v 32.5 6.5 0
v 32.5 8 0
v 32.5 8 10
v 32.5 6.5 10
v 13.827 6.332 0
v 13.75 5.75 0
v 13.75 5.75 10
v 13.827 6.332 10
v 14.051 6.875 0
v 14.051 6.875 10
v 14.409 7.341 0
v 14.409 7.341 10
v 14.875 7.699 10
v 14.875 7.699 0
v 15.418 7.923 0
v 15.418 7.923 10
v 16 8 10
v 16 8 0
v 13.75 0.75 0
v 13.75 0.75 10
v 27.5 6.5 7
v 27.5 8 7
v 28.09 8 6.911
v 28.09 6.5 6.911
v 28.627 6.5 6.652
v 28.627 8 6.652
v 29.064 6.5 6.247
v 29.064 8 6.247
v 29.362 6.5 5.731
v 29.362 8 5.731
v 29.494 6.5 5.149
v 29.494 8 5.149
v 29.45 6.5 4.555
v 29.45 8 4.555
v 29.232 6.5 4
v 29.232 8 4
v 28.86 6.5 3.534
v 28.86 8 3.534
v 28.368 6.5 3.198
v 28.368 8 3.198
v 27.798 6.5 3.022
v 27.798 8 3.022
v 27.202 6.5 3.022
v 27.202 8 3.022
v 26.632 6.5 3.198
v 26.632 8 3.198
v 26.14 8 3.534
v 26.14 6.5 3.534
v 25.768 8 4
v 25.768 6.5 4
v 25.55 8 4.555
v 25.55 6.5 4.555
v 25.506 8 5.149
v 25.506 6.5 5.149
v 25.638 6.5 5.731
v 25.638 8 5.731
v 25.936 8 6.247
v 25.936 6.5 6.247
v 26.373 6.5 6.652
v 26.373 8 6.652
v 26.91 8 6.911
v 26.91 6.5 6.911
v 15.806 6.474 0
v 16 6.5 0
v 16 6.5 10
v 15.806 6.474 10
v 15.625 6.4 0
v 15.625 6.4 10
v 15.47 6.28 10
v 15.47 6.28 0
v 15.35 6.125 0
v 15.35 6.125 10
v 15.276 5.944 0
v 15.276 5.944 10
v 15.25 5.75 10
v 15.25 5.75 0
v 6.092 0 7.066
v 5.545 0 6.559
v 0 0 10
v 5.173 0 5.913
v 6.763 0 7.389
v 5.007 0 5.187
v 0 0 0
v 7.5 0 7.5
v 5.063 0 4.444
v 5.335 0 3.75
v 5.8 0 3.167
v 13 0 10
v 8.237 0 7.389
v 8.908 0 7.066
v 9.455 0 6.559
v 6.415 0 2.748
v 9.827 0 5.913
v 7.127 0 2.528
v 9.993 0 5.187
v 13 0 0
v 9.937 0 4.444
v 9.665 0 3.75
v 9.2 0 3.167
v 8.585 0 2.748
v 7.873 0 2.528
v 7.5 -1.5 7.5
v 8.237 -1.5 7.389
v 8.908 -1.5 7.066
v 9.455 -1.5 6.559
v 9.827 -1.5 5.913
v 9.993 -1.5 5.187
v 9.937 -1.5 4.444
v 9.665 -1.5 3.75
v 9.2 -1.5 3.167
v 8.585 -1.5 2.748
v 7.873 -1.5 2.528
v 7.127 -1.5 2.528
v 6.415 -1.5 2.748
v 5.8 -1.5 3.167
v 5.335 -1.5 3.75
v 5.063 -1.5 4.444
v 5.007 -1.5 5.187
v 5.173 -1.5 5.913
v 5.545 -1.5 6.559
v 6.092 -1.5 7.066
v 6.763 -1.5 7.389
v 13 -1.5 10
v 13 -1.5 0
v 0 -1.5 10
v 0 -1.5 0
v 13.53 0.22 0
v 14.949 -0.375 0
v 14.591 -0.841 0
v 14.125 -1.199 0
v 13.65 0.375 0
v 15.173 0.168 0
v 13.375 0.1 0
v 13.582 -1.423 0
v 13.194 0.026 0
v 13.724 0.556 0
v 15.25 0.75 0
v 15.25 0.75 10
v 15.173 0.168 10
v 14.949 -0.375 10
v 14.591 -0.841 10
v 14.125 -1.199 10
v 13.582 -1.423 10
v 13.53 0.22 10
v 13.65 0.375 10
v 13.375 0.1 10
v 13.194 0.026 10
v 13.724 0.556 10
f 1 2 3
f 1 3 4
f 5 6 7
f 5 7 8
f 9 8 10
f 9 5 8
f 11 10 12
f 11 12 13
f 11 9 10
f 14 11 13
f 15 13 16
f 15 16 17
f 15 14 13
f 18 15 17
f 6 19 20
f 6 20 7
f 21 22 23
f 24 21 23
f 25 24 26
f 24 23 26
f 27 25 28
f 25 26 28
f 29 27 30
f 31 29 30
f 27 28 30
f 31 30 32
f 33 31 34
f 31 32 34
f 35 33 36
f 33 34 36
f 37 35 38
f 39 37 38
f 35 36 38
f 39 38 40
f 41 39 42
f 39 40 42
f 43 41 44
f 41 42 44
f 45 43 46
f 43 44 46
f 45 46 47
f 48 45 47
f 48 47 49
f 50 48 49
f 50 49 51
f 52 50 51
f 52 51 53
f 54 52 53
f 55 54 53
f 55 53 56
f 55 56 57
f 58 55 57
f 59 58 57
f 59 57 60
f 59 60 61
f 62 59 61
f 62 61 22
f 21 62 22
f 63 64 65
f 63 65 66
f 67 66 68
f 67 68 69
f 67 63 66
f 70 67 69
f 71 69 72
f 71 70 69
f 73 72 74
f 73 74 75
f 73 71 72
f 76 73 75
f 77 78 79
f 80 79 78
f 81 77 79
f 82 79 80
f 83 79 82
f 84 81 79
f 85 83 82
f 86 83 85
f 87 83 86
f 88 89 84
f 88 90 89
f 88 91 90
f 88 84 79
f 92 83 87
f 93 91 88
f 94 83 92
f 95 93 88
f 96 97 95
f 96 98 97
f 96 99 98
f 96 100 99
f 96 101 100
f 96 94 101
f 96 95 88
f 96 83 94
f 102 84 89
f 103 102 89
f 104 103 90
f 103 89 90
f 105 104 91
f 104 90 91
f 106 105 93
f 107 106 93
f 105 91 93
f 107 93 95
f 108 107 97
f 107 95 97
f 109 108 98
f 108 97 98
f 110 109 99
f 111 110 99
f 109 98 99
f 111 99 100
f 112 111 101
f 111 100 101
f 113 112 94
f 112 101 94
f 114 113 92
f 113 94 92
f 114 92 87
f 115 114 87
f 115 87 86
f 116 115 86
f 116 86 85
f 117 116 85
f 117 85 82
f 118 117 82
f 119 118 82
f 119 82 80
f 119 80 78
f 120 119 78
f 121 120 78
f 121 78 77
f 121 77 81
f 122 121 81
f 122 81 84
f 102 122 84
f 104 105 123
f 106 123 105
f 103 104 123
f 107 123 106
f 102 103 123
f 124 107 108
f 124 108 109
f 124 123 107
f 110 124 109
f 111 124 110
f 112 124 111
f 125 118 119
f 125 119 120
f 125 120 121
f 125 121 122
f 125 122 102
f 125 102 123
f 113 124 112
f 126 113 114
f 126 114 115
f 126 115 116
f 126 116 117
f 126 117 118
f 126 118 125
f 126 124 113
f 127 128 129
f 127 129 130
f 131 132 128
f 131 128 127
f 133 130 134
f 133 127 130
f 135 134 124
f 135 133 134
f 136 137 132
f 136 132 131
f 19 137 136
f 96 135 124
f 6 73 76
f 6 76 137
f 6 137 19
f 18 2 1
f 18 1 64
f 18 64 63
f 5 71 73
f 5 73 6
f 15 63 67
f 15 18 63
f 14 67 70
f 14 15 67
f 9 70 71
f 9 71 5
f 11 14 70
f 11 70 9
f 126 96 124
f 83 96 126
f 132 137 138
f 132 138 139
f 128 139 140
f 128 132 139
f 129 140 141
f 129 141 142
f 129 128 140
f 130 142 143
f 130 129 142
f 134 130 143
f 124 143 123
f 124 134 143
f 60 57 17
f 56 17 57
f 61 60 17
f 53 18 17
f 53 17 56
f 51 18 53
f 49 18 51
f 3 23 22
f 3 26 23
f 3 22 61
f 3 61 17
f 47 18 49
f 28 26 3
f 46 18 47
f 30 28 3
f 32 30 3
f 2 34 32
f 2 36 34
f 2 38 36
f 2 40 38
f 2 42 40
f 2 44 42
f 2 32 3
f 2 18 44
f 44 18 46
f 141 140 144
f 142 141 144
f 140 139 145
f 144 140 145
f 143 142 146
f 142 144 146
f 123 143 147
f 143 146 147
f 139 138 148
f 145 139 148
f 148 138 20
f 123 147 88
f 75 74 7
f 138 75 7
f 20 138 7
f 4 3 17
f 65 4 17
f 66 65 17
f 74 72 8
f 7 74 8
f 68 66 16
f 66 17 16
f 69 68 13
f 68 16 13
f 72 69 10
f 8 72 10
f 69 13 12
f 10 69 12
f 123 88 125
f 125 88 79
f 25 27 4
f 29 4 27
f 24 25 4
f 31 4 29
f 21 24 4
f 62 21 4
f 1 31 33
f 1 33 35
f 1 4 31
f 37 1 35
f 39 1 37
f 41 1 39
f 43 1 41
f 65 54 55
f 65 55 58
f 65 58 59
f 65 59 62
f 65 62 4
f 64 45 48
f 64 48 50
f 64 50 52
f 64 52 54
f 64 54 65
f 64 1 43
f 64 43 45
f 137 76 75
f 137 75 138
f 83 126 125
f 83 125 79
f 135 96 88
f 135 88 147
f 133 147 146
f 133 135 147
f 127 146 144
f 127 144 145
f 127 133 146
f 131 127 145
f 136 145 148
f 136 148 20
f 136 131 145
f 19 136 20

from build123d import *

# Parameters (mm, degrees)
BASE_FLANGE1_DEPTH = 10
SKETCH6_R          = 2.5
CUT_EXTRUDE1_DEPTH = 35.932076949
SKETCH7_R          = 2
CUT_EXTRUDE2_DEPTH = 36.305806888


# Sheet-metal steps are written as plain solids
with BuildPart() as part:
    # Sketch1 → Base-Flange1 (new body)
    with BuildSketch(Plane.XY):
        with BuildLine():
            Line((0, 0), (13, 0))
            ThreePointArc((13, 0), (13.530330086, 0.219669914), (13.75, 0.75))
            Line((13.75, 0.75), (13.75, 5.75))
            ThreePointArc((13.75, 5.75), (14.409009742, 7.340990258), (16, 8))
            Line((16, 8), (32.5, 8))
            Line((32.5, 8), (32.5, 6.5))
            Line((32.5, 6.5), (16, 6.5))
            ThreePointArc((16, 6.5), (15.469669914, 6.280330086), (15.25, 5.75))
            Line((15.25, 5.75), (15.25, 0.75))
            ThreePointArc((15.25, 0.75), (14.590990258, -0.840990258), (13, -1.5))
            Line((13, -1.5), (0, -1.5))
            Line((0, -1.5), (0, 0))
        make_face()
    extrude(amount=BASE_FLANGE1_DEPTH)

    # Sketch6 → Cut-Extrude1 (cut, through all)
    with BuildSketch(Plane(origin=(0, 0, 0), x_dir=(1, 0, 0), z_dir=(0, 1, 0))):
        with Locations(Location((7.5, -5, 0), (0, 0, 270))):
            Circle(SKETCH6_R)
    extrude(amount=-CUT_EXTRUDE1_DEPTH, mode=Mode.SUBTRACT)

    # Sketch7 → Cut-Extrude2 (cut, through all)
    with BuildSketch(Plane(origin=(0, 8, 0), x_dir=(1, 0, 0), z_dir=(0, 1, 0))):
        with Locations(Location((27.5, -5, 0), (0, 0, 270))):
            Circle(SKETCH7_R)
    extrude(amount=-CUT_EXTRUDE2_DEPTH, mode=Mode.SUBTRACT)


solid = part.part
